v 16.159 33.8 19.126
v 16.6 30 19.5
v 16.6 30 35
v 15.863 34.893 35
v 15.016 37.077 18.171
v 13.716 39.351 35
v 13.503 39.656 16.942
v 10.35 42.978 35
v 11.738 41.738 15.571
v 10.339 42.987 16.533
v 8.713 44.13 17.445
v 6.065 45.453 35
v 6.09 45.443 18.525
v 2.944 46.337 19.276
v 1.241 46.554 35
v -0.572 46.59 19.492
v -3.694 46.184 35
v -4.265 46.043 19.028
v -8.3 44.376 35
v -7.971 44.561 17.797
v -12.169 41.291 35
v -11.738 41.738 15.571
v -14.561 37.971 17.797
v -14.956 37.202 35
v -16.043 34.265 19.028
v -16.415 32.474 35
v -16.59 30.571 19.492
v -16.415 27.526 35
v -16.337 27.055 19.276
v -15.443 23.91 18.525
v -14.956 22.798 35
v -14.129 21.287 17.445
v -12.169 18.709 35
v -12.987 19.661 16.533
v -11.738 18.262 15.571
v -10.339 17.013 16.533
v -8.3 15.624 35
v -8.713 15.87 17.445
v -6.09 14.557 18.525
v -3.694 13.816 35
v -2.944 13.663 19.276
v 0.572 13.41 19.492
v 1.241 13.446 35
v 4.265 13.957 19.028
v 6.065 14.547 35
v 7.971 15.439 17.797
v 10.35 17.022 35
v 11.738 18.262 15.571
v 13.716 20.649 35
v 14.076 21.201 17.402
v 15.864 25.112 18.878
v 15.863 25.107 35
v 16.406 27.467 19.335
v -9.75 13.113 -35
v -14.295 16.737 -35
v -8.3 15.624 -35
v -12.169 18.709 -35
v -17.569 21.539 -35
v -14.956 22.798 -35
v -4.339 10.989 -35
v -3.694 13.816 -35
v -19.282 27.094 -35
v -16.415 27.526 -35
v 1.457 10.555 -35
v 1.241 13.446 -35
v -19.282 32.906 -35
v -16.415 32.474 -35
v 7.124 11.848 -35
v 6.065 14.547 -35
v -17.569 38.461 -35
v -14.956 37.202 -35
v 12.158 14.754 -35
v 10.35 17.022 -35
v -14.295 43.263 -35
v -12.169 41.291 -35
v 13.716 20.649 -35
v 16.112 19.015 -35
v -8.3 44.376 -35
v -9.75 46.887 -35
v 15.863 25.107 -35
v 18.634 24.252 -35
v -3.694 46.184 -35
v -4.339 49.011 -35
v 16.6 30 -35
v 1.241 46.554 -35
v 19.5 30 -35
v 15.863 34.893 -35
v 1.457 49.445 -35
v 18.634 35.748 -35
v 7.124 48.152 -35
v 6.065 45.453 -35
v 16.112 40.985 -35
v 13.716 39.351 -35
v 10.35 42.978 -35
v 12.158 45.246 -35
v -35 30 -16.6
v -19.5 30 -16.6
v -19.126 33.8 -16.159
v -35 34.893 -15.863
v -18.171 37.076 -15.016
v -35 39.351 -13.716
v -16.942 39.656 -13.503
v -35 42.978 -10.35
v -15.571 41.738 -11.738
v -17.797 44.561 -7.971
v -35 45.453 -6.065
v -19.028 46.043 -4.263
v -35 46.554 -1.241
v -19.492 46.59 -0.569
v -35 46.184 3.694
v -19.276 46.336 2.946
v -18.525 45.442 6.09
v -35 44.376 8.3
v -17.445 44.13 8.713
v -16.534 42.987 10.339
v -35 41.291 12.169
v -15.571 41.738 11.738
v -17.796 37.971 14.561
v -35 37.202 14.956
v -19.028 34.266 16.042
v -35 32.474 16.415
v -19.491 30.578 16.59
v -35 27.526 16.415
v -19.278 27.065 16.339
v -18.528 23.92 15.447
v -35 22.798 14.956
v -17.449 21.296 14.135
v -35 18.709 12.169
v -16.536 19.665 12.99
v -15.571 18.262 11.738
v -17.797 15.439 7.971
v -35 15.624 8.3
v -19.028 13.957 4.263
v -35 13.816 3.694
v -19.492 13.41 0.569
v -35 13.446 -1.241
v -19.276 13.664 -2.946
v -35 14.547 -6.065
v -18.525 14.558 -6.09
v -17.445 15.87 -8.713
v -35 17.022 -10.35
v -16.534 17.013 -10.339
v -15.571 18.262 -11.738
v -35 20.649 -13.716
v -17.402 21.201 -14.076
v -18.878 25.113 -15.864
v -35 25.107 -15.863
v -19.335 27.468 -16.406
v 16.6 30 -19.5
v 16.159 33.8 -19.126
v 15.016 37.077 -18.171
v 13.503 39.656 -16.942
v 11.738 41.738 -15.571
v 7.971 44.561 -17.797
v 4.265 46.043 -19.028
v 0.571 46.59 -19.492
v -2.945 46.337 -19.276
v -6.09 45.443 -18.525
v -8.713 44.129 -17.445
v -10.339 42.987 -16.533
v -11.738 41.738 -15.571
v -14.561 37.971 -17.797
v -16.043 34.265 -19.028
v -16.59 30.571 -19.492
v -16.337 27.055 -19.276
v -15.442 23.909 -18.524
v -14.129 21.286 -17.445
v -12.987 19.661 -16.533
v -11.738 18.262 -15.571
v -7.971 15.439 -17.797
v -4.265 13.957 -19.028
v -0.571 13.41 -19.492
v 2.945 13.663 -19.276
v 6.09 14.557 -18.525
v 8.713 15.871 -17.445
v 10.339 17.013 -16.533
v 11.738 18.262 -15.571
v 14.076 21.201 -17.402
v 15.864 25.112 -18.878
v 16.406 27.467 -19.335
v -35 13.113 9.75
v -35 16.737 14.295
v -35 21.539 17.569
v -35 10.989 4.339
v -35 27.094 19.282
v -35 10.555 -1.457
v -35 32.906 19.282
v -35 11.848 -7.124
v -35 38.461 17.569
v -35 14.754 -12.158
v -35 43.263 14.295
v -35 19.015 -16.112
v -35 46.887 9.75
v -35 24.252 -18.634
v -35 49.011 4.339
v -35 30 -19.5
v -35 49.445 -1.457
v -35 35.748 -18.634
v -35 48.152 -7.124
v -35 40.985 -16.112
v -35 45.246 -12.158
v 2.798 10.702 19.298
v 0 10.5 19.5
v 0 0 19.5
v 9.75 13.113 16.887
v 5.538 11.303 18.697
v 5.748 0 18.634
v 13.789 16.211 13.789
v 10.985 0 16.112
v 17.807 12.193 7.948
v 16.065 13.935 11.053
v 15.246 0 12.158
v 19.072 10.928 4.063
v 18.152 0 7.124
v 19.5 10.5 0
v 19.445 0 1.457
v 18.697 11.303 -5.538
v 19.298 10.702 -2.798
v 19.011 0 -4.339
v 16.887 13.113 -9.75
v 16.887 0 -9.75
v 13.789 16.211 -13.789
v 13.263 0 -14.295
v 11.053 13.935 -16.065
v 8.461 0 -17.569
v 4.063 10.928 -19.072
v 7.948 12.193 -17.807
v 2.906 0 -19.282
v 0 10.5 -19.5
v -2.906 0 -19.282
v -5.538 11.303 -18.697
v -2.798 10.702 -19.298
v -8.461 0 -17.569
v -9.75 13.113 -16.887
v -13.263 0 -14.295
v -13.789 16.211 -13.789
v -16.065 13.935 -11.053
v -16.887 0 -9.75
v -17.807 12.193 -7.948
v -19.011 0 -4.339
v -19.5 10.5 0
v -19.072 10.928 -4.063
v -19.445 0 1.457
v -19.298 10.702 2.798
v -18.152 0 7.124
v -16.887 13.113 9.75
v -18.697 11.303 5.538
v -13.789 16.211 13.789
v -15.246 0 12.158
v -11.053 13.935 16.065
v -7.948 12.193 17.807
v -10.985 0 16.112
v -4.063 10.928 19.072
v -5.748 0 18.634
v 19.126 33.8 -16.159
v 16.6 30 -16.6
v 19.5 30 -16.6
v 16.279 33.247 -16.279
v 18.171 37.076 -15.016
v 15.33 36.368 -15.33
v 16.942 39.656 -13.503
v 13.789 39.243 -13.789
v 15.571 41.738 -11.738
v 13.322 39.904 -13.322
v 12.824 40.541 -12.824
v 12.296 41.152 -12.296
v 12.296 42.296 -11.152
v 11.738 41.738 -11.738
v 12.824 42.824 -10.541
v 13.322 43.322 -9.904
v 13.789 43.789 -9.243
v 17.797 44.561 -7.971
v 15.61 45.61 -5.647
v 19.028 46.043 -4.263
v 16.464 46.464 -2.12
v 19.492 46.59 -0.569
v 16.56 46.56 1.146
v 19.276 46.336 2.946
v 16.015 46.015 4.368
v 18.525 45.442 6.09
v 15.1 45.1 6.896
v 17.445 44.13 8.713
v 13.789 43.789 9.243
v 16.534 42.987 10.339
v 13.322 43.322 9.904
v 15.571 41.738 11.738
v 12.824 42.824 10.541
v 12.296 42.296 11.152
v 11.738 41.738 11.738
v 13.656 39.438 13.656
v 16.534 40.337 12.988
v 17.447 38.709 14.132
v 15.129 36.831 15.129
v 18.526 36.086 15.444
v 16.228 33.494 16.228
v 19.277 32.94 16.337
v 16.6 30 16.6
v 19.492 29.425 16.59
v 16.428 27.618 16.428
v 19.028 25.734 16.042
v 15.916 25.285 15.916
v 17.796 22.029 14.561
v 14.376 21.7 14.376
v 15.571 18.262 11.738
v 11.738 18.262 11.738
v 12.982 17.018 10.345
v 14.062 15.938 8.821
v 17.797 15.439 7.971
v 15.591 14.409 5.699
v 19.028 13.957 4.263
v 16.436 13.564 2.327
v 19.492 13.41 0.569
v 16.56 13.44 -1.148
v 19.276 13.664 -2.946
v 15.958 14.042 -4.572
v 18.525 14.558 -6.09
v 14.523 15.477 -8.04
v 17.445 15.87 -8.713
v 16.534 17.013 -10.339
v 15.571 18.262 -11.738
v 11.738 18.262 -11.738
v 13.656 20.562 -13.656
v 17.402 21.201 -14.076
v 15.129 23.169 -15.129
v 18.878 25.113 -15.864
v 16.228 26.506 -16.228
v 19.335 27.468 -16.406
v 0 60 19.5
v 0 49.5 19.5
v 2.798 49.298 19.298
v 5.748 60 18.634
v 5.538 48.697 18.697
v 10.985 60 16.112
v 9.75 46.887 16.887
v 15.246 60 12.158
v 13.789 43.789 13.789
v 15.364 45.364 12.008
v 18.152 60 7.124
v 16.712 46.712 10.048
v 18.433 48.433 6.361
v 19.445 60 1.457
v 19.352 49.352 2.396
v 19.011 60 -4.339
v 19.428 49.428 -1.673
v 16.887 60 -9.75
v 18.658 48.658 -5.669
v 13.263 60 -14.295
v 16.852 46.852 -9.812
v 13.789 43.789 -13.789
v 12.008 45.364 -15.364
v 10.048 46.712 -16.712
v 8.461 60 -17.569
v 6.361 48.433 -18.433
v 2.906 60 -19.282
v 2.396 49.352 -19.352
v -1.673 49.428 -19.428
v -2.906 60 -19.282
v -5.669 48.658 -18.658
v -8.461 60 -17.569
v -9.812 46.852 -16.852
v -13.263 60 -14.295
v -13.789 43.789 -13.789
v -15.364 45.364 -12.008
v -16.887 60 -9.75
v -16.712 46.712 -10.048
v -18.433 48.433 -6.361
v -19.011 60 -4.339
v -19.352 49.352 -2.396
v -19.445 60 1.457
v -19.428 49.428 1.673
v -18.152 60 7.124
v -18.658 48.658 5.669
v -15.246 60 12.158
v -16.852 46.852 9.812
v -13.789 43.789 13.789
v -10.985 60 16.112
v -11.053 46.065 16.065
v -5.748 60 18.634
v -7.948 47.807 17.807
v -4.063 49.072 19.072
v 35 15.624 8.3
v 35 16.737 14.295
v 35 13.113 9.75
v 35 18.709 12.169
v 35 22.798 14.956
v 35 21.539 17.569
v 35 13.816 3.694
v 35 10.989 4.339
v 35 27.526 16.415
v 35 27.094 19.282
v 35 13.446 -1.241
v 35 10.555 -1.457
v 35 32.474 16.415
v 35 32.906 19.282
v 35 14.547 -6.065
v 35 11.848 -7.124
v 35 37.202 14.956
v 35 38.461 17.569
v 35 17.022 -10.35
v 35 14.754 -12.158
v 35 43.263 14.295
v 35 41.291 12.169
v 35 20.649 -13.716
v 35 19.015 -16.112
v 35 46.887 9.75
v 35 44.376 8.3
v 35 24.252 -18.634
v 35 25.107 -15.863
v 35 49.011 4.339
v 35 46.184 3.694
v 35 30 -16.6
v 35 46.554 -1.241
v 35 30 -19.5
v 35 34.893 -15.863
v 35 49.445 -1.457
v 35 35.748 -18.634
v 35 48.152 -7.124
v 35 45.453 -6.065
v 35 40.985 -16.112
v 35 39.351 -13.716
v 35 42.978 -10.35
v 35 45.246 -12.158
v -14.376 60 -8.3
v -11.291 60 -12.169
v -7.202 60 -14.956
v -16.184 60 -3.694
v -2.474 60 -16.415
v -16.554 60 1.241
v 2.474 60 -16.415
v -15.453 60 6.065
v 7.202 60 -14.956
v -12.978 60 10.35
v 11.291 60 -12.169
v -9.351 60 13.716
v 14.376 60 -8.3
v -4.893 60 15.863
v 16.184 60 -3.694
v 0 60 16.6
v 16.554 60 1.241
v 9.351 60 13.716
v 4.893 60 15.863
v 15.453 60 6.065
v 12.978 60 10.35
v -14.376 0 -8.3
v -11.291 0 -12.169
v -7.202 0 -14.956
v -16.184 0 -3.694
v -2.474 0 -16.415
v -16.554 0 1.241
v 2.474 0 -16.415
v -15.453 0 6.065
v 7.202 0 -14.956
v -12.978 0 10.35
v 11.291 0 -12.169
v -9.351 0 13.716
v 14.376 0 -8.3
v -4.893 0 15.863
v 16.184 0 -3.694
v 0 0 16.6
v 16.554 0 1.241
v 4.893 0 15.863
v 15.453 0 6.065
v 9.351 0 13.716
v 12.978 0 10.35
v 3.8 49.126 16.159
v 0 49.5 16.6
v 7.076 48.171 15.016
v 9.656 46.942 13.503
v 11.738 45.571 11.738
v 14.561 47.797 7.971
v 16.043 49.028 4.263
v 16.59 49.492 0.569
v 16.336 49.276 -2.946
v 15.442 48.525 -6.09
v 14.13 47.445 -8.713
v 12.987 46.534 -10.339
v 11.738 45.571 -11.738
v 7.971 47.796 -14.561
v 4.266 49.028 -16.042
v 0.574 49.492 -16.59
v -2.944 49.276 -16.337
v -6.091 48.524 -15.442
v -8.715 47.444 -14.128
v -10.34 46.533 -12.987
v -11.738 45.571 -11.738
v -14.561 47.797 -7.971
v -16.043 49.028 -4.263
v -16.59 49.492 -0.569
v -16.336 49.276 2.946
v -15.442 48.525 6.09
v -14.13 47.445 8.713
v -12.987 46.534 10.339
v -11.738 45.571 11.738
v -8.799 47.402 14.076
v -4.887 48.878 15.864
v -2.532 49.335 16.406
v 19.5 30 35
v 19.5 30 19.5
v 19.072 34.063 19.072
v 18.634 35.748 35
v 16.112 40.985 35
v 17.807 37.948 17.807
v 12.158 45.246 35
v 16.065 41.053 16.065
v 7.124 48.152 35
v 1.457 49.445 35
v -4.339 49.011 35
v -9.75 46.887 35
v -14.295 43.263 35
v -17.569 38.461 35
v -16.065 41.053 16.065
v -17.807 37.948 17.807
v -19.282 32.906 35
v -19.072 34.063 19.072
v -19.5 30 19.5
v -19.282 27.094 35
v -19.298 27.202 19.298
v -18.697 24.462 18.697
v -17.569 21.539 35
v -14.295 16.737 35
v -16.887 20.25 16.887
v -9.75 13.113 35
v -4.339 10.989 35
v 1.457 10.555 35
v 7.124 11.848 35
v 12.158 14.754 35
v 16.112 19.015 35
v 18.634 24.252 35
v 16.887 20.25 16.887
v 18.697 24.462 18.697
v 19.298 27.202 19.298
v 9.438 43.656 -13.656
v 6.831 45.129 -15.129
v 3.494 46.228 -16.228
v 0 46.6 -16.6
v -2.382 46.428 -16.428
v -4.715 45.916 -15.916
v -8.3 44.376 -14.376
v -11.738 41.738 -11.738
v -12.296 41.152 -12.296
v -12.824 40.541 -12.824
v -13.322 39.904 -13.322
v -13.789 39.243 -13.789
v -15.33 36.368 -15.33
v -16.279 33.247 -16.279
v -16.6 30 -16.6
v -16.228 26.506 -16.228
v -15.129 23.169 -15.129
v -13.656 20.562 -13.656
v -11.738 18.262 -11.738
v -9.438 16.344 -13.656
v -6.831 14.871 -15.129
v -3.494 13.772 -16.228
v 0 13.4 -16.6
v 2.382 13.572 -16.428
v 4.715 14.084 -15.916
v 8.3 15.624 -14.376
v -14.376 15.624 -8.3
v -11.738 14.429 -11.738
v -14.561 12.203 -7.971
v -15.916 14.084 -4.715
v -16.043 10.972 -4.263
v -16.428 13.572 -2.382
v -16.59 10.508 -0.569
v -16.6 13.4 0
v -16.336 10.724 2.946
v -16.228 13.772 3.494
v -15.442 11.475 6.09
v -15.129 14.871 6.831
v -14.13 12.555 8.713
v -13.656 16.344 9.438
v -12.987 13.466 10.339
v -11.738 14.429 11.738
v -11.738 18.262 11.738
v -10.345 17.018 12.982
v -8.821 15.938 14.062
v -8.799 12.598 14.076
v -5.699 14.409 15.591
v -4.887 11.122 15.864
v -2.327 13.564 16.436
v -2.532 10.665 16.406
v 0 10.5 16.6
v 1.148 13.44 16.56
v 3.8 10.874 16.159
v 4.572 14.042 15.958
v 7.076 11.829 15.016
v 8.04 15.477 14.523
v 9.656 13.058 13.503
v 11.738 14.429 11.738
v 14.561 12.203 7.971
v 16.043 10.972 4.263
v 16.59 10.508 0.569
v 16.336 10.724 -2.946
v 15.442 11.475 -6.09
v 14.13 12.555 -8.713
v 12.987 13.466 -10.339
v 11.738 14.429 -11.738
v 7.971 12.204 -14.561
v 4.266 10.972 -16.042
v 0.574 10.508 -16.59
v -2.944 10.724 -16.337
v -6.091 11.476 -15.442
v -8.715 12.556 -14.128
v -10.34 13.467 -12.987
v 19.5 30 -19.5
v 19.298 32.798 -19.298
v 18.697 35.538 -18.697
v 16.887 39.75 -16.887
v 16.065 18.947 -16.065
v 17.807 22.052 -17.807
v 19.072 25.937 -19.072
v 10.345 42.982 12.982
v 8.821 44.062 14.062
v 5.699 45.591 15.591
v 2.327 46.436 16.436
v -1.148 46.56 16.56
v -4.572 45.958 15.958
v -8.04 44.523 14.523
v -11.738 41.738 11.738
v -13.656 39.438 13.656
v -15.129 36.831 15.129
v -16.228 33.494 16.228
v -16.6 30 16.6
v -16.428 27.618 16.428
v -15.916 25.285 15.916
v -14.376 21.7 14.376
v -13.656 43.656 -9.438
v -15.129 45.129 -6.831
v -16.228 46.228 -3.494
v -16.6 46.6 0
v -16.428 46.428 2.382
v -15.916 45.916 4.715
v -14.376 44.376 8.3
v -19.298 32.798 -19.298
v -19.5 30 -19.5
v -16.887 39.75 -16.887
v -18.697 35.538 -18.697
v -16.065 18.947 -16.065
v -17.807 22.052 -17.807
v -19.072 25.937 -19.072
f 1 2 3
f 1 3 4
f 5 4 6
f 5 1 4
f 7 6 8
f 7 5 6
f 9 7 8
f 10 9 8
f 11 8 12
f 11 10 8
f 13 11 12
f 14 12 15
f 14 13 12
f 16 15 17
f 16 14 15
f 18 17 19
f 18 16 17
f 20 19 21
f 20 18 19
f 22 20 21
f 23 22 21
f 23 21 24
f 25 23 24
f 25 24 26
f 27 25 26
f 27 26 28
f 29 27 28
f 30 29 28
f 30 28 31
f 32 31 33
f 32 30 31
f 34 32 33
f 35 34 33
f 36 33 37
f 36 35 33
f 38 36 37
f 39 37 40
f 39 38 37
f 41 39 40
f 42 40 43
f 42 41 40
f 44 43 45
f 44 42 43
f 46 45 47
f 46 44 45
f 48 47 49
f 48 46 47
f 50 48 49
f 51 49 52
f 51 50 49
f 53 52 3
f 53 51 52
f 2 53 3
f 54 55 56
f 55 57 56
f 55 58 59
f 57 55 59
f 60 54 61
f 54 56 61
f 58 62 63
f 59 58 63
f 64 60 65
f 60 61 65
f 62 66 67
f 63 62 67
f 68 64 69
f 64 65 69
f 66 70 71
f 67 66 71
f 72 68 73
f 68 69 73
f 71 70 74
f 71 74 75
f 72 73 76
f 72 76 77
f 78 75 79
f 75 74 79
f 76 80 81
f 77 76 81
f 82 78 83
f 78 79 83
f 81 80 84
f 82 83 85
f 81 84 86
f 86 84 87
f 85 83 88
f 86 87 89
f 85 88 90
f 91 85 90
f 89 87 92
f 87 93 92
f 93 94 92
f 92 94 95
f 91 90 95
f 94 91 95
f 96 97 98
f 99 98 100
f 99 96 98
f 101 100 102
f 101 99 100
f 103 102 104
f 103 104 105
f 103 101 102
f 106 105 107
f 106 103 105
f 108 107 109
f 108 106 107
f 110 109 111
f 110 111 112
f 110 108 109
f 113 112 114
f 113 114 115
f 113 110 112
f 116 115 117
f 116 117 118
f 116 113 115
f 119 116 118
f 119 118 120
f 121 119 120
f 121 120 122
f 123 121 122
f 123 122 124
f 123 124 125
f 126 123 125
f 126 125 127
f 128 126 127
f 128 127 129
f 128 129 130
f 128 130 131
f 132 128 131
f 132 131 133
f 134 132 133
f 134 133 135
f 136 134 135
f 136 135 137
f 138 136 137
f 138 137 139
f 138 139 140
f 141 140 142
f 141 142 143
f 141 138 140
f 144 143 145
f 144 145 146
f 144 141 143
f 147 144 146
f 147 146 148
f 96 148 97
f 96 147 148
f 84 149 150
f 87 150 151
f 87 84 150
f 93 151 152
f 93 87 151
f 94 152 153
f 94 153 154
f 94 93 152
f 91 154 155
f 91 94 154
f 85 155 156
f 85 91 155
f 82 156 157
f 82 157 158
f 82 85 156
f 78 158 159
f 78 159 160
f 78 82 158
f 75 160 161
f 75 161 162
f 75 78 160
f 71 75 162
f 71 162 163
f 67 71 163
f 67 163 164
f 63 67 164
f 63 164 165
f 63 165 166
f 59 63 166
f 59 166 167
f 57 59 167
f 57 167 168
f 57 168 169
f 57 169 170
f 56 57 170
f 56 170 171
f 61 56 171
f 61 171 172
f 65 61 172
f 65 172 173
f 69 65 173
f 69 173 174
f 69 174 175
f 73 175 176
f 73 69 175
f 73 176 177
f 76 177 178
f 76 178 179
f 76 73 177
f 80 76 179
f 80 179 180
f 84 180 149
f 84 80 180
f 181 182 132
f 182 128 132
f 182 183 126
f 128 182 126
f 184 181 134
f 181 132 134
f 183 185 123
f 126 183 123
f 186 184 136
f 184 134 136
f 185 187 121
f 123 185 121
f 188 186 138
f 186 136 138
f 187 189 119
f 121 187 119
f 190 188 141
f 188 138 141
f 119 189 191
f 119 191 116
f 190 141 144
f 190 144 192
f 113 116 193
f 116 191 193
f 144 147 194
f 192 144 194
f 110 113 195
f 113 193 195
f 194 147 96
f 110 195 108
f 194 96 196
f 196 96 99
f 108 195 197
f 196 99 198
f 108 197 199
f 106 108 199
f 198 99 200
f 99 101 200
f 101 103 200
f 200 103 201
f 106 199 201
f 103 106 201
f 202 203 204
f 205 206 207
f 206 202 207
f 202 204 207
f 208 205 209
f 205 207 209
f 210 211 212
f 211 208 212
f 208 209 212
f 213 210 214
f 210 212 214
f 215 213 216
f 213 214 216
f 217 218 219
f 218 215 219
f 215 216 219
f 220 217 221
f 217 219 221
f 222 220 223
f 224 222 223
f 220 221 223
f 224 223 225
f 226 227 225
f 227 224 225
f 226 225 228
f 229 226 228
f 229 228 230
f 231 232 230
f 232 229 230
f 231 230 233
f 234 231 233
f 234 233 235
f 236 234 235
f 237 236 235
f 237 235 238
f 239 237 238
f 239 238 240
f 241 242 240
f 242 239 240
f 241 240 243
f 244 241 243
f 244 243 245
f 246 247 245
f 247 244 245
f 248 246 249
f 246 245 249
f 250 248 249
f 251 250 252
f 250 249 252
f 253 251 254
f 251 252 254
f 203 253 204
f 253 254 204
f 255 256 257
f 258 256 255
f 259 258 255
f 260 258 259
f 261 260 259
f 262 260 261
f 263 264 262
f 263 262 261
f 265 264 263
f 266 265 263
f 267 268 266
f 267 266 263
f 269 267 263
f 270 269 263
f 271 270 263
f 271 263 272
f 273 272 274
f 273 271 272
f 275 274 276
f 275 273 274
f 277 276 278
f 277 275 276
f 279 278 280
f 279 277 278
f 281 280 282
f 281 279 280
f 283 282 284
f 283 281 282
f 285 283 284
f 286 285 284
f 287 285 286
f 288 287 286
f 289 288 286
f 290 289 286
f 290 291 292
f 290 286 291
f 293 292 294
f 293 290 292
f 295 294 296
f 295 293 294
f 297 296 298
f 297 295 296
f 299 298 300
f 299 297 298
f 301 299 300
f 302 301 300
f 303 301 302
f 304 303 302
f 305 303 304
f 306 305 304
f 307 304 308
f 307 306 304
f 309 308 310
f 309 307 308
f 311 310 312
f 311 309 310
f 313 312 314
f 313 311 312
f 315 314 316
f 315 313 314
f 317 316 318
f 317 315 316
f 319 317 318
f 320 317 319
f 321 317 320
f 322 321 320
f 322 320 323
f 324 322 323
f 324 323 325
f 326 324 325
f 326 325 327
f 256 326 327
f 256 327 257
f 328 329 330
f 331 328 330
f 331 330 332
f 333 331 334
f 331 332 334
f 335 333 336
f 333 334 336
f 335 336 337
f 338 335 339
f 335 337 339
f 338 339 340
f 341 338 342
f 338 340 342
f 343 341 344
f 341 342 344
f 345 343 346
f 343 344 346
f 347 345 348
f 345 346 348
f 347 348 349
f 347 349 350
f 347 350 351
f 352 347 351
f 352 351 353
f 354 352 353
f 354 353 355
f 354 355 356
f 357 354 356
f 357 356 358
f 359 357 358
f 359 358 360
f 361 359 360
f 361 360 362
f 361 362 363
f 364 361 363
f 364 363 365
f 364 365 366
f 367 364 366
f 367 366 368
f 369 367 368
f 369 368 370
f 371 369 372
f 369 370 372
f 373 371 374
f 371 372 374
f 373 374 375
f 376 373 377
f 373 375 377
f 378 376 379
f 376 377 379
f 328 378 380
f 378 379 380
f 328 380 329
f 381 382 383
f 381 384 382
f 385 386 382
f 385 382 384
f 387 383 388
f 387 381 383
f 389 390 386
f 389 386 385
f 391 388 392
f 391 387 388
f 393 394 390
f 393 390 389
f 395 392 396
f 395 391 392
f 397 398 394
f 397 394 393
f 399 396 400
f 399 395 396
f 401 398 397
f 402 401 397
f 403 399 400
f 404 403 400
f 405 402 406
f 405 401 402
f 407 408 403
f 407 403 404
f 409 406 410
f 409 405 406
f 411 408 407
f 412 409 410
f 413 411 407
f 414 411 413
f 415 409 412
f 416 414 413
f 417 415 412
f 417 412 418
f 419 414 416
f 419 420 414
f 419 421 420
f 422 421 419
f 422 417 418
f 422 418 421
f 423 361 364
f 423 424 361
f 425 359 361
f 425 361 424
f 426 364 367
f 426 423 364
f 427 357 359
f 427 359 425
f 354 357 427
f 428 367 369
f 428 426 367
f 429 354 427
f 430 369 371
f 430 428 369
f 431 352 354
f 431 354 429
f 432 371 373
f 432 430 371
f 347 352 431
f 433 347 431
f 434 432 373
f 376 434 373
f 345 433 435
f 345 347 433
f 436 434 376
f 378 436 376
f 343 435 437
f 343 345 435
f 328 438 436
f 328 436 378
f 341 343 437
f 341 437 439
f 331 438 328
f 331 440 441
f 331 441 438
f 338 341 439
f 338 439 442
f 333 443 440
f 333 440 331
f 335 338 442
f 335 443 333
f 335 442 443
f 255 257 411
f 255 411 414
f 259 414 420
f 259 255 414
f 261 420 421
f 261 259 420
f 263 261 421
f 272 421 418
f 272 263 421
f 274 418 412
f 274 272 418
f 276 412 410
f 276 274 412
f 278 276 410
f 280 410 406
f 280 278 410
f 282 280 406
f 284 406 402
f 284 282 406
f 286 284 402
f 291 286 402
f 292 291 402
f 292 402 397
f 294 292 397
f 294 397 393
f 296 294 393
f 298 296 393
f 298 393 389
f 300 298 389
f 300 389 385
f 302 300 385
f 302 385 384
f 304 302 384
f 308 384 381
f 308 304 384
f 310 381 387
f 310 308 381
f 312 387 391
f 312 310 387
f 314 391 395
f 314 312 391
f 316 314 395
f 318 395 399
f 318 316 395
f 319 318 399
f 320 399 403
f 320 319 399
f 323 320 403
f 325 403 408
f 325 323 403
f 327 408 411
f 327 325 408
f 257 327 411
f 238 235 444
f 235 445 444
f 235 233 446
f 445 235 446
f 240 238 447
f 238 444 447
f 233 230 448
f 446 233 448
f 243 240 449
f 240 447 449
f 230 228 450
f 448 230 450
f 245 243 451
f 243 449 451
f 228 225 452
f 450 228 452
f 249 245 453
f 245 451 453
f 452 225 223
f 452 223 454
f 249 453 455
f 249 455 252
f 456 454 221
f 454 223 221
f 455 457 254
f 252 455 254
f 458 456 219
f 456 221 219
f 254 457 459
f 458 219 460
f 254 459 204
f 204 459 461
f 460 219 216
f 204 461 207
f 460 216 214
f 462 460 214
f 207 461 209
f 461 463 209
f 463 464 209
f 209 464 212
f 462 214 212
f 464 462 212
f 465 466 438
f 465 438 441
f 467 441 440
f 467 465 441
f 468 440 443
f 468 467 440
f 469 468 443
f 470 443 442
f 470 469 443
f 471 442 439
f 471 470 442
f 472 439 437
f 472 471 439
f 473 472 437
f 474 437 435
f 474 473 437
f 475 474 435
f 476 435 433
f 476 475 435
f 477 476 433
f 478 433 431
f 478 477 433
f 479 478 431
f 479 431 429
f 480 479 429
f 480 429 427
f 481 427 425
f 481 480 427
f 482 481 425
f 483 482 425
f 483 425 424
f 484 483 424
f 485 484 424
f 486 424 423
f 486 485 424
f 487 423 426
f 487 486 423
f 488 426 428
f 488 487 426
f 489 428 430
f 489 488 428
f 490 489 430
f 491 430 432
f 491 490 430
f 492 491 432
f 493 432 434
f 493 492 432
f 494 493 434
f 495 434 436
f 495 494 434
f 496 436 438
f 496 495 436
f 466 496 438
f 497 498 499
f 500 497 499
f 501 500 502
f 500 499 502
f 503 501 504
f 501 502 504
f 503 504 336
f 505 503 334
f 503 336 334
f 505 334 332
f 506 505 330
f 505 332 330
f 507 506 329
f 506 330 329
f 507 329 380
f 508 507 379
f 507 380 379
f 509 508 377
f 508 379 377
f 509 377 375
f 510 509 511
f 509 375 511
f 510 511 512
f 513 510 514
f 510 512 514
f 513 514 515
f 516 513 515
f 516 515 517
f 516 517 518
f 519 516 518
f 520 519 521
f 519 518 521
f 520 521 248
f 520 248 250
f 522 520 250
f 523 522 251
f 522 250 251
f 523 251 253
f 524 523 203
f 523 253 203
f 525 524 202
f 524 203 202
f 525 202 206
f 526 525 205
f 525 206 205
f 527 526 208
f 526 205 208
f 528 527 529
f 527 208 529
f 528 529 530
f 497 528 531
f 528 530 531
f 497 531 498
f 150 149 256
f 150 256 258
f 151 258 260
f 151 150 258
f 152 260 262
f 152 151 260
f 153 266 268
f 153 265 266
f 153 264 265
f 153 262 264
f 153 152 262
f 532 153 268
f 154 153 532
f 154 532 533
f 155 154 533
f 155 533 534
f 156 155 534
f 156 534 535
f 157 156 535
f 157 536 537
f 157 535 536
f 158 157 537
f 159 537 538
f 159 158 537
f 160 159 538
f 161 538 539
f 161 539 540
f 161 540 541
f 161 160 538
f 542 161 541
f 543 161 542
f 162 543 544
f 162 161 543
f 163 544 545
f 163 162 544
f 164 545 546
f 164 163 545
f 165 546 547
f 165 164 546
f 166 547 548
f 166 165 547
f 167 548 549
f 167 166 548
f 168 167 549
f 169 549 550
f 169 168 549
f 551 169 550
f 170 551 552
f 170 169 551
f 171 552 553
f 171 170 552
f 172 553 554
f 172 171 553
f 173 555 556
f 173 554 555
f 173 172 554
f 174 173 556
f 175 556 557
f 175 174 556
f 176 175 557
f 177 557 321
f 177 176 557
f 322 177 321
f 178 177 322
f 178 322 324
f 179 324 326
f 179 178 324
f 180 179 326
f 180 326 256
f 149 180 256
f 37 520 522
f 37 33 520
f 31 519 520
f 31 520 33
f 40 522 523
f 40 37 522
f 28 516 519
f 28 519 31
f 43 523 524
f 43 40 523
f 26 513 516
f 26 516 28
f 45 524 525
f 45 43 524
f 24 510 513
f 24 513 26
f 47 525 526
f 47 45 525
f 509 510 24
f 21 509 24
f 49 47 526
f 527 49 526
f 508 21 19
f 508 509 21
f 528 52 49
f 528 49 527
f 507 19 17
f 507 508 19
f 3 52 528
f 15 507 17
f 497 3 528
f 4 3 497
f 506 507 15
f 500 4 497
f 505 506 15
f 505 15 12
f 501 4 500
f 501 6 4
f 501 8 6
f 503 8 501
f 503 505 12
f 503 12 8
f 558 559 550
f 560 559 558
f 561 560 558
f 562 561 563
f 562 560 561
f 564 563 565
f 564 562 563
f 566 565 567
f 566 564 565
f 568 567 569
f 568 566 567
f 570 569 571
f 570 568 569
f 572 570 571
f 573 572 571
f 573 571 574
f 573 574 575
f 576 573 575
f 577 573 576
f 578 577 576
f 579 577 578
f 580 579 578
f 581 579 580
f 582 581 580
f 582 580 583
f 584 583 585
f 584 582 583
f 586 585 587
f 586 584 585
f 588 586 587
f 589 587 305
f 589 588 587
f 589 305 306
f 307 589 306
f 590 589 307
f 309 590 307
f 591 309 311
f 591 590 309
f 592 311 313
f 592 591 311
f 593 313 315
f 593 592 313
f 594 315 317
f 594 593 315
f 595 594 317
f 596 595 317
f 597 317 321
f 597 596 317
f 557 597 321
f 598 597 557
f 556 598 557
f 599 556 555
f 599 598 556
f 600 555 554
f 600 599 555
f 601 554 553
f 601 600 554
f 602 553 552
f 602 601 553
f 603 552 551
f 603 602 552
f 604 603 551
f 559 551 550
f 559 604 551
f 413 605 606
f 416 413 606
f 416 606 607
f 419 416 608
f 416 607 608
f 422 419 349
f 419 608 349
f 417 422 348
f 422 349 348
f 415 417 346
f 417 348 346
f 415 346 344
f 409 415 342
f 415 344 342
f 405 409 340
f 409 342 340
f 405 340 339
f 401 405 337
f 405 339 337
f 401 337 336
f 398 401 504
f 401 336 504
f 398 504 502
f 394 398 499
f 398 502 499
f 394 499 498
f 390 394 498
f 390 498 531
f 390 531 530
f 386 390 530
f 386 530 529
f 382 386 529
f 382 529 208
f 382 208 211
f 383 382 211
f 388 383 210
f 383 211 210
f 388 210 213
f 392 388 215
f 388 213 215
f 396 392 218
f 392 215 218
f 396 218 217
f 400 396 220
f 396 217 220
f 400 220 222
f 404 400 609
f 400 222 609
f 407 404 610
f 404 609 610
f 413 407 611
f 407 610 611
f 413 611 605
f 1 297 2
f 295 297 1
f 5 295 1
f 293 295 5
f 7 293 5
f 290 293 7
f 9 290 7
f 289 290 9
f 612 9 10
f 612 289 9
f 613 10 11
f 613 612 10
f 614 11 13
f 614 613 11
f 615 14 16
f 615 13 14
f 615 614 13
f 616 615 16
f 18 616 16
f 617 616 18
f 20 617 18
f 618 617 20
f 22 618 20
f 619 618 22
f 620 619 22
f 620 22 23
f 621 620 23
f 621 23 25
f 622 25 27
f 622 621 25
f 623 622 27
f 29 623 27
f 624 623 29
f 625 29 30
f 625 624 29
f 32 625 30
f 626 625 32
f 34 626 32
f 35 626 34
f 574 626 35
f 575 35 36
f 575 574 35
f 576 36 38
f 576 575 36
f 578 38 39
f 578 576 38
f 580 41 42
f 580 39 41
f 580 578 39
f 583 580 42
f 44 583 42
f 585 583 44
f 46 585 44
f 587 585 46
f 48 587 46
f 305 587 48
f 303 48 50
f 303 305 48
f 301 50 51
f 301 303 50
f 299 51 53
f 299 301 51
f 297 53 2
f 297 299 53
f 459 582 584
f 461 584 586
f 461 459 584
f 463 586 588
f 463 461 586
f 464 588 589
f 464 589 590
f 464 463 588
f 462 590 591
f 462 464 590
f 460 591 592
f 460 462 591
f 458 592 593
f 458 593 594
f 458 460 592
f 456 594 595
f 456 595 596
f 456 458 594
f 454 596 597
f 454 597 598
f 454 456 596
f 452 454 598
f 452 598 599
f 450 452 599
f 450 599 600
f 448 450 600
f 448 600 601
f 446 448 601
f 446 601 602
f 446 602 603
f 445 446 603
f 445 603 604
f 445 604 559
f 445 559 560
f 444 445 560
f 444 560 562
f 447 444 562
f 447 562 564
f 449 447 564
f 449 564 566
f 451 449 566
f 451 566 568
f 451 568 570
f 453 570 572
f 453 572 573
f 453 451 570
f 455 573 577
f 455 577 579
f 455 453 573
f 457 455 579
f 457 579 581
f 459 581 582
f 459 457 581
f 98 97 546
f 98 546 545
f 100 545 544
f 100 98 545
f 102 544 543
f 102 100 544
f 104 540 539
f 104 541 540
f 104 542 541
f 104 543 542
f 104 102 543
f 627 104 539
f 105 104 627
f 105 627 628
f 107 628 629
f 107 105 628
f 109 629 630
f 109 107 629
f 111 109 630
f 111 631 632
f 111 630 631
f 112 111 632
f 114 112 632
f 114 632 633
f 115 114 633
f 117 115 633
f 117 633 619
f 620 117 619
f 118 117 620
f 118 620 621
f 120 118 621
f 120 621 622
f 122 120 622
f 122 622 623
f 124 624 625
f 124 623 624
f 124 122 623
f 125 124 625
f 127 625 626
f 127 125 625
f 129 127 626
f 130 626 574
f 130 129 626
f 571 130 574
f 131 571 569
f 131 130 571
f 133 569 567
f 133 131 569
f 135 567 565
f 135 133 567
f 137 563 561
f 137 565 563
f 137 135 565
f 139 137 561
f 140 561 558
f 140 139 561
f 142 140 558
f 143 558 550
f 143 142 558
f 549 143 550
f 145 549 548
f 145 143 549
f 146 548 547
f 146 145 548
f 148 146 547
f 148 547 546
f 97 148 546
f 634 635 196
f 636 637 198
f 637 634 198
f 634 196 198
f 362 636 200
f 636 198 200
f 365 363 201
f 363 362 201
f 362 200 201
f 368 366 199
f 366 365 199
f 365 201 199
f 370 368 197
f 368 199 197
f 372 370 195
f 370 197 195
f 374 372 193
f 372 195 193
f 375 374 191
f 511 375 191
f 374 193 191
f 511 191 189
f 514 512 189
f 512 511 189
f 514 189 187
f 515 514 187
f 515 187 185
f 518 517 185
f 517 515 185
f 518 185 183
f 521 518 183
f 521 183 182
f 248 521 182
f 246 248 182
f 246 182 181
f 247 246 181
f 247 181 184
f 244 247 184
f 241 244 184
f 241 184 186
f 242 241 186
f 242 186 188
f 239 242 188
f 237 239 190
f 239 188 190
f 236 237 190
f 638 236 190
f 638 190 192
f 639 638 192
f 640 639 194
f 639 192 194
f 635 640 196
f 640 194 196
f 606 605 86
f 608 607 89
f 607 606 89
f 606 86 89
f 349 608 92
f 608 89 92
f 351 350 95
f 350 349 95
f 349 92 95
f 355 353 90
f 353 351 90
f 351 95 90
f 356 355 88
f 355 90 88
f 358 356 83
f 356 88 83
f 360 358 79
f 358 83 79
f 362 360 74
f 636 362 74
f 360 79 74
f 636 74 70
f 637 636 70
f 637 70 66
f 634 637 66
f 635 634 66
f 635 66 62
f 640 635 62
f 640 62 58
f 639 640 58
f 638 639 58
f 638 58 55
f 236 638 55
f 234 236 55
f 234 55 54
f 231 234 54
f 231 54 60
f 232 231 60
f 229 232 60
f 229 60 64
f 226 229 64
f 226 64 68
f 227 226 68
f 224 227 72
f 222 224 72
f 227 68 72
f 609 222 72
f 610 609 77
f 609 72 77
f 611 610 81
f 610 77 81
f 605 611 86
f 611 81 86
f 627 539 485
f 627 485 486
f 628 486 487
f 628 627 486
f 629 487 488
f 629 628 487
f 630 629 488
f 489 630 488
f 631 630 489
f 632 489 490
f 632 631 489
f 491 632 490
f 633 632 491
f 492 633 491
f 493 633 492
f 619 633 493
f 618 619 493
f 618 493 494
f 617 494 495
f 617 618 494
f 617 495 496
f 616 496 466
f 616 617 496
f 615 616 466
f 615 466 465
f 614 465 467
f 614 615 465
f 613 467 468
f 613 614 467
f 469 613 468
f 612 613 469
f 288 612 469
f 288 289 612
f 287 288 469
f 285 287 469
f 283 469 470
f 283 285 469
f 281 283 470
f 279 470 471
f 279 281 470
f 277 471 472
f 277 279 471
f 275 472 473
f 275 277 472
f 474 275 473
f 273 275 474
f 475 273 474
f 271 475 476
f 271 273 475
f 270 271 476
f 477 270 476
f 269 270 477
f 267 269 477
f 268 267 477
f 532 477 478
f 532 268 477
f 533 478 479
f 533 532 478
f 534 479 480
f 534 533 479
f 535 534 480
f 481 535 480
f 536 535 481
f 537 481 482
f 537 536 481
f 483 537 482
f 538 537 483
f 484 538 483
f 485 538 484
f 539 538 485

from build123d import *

# Parameters (mm, degrees)
CROQUIS1_R                   = 19.5
CROQUIS1_R_2                 = 16.6
SALIENTE_EXTRUIR1_DEPTH      = 60
SALIENTE_EXTRUIR3_DEPTH      = 35
SALIENTE_EXTRUIR3_DEPTH_BACK = 35
CROQUIS2_R                   = 19.5
CROQUIS2_R_2                 = 16.6
SALIENTE_EXTRUIR4_DEPTH      = 35
SALIENTE_EXTRUIR4_DEPTH_BACK = 35
CROQUIS3_R                   = 19.5
CROQUIS3_R_2                 = 16.6
CORTAR_EXTRUIR1_DEPTH        = 35
CORTAR_EXTRUIR1_DEPTH_BACK   = 35
CORTAR_EXTRUIR2_DEPTH        = 35
CORTAR_EXTRUIR2_DEPTH_BACK   = 35
CROQUIS7_R                   = 16.6
CORTAR_EXTRUIR3_DEPTH        = 60


with BuildPart() as part:
    # Croquis1 → Saliente-Extruir1 (new body)
    with BuildSketch(Plane(origin=(0, 0, 0), x_dir=(1, 0, 0), z_dir=(0, 1, 0))):
        Circle(CROQUIS1_R)
        Circle(CROQUIS1_R_2, mode=Mode.SUBTRACT)
    extrude(amount=SALIENTE_EXTRUIR1_DEPTH)

    # Croquis2 → Saliente-Extruir3 (add, two sides: drawn at the far end of the back side and taken through both)
    with BuildSketch(Plane(origin=(0, 0, 0), x_dir=(0, 0, -1), z_dir=(1, 0, 0)).offset(-SALIENTE_EXTRUIR3_DEPTH_BACK)):
        with Locations((0, 30)):
            Circle(CROQUIS2_R)
        with Locations((0, 30)):
            Circle(CROQUIS2_R_2, mode=Mode.SUBTRACT)
    extrude(amount=SALIENTE_EXTRUIR3_DEPTH + SALIENTE_EXTRUIR3_DEPTH_BACK)

    # Croquis3 → Saliente-Extruir4 (add, two sides: drawn at the far end of the back side and taken through both)
    with BuildSketch(Plane.XY.offset(-SALIENTE_EXTRUIR4_DEPTH_BACK)):
        with Locations((0, 30)):
            Circle(CROQUIS3_R)
        with Locations((0, 30)):
            Circle(CROQUIS3_R_2, mode=Mode.SUBTRACT)
    extrude(amount=SALIENTE_EXTRUIR4_DEPTH + SALIENTE_EXTRUIR4_DEPTH_BACK)

    # Croquis5 → Cortar-Extruir1 (cut, two sides: drawn at the far end of the back side and taken through both)
    with BuildSketch(Plane(origin=(0, 0, 0), x_dir=(0, 0, -1), z_dir=(1, 0, 0)).offset(-CORTAR_EXTRUIR1_DEPTH_BACK)):
        with BuildLine():
            ThreePointArc((0, 46.6), (-11.737972568, 18.262027432), (16.6, 30))
            ThreePointArc((16.6, 30), (11.737972568, 41.737972568), (0, 46.6))
        make_face()
    extrude(amount=CORTAR_EXTRUIR1_DEPTH + CORTAR_EXTRUIR1_DEPTH_BACK, mode=Mode.SUBTRACT)

    # Croquis6 → Cortar-Extruir2 (cut, two sides: drawn at the far end of the back side and taken through both)
    with BuildSketch(Plane.XY.offset(-CORTAR_EXTRUIR2_DEPTH_BACK)):
        with BuildLine():
            ThreePointArc((0, 46.6), (-11.737972568, 18.262027432), (16.6, 30))
            ThreePointArc((16.6, 30), (11.737972568, 41.737972568), (0, 46.6))
        make_face()
    extrude(amount=CORTAR_EXTRUIR2_DEPTH + CORTAR_EXTRUIR2_DEPTH_BACK, mode=Mode.SUBTRACT)

    # Croquis7 → Cortar-Extruir3 (cut)
    with BuildSketch(Plane(origin=(0, 0, 0), x_dir=(1, 0, 0), z_dir=(0, 1, 0))):
        Circle(CROQUIS7_R)
    extrude(amount=CORTAR_EXTRUIR3_DEPTH, mode=Mode.SUBTRACT)


solid = part.part
